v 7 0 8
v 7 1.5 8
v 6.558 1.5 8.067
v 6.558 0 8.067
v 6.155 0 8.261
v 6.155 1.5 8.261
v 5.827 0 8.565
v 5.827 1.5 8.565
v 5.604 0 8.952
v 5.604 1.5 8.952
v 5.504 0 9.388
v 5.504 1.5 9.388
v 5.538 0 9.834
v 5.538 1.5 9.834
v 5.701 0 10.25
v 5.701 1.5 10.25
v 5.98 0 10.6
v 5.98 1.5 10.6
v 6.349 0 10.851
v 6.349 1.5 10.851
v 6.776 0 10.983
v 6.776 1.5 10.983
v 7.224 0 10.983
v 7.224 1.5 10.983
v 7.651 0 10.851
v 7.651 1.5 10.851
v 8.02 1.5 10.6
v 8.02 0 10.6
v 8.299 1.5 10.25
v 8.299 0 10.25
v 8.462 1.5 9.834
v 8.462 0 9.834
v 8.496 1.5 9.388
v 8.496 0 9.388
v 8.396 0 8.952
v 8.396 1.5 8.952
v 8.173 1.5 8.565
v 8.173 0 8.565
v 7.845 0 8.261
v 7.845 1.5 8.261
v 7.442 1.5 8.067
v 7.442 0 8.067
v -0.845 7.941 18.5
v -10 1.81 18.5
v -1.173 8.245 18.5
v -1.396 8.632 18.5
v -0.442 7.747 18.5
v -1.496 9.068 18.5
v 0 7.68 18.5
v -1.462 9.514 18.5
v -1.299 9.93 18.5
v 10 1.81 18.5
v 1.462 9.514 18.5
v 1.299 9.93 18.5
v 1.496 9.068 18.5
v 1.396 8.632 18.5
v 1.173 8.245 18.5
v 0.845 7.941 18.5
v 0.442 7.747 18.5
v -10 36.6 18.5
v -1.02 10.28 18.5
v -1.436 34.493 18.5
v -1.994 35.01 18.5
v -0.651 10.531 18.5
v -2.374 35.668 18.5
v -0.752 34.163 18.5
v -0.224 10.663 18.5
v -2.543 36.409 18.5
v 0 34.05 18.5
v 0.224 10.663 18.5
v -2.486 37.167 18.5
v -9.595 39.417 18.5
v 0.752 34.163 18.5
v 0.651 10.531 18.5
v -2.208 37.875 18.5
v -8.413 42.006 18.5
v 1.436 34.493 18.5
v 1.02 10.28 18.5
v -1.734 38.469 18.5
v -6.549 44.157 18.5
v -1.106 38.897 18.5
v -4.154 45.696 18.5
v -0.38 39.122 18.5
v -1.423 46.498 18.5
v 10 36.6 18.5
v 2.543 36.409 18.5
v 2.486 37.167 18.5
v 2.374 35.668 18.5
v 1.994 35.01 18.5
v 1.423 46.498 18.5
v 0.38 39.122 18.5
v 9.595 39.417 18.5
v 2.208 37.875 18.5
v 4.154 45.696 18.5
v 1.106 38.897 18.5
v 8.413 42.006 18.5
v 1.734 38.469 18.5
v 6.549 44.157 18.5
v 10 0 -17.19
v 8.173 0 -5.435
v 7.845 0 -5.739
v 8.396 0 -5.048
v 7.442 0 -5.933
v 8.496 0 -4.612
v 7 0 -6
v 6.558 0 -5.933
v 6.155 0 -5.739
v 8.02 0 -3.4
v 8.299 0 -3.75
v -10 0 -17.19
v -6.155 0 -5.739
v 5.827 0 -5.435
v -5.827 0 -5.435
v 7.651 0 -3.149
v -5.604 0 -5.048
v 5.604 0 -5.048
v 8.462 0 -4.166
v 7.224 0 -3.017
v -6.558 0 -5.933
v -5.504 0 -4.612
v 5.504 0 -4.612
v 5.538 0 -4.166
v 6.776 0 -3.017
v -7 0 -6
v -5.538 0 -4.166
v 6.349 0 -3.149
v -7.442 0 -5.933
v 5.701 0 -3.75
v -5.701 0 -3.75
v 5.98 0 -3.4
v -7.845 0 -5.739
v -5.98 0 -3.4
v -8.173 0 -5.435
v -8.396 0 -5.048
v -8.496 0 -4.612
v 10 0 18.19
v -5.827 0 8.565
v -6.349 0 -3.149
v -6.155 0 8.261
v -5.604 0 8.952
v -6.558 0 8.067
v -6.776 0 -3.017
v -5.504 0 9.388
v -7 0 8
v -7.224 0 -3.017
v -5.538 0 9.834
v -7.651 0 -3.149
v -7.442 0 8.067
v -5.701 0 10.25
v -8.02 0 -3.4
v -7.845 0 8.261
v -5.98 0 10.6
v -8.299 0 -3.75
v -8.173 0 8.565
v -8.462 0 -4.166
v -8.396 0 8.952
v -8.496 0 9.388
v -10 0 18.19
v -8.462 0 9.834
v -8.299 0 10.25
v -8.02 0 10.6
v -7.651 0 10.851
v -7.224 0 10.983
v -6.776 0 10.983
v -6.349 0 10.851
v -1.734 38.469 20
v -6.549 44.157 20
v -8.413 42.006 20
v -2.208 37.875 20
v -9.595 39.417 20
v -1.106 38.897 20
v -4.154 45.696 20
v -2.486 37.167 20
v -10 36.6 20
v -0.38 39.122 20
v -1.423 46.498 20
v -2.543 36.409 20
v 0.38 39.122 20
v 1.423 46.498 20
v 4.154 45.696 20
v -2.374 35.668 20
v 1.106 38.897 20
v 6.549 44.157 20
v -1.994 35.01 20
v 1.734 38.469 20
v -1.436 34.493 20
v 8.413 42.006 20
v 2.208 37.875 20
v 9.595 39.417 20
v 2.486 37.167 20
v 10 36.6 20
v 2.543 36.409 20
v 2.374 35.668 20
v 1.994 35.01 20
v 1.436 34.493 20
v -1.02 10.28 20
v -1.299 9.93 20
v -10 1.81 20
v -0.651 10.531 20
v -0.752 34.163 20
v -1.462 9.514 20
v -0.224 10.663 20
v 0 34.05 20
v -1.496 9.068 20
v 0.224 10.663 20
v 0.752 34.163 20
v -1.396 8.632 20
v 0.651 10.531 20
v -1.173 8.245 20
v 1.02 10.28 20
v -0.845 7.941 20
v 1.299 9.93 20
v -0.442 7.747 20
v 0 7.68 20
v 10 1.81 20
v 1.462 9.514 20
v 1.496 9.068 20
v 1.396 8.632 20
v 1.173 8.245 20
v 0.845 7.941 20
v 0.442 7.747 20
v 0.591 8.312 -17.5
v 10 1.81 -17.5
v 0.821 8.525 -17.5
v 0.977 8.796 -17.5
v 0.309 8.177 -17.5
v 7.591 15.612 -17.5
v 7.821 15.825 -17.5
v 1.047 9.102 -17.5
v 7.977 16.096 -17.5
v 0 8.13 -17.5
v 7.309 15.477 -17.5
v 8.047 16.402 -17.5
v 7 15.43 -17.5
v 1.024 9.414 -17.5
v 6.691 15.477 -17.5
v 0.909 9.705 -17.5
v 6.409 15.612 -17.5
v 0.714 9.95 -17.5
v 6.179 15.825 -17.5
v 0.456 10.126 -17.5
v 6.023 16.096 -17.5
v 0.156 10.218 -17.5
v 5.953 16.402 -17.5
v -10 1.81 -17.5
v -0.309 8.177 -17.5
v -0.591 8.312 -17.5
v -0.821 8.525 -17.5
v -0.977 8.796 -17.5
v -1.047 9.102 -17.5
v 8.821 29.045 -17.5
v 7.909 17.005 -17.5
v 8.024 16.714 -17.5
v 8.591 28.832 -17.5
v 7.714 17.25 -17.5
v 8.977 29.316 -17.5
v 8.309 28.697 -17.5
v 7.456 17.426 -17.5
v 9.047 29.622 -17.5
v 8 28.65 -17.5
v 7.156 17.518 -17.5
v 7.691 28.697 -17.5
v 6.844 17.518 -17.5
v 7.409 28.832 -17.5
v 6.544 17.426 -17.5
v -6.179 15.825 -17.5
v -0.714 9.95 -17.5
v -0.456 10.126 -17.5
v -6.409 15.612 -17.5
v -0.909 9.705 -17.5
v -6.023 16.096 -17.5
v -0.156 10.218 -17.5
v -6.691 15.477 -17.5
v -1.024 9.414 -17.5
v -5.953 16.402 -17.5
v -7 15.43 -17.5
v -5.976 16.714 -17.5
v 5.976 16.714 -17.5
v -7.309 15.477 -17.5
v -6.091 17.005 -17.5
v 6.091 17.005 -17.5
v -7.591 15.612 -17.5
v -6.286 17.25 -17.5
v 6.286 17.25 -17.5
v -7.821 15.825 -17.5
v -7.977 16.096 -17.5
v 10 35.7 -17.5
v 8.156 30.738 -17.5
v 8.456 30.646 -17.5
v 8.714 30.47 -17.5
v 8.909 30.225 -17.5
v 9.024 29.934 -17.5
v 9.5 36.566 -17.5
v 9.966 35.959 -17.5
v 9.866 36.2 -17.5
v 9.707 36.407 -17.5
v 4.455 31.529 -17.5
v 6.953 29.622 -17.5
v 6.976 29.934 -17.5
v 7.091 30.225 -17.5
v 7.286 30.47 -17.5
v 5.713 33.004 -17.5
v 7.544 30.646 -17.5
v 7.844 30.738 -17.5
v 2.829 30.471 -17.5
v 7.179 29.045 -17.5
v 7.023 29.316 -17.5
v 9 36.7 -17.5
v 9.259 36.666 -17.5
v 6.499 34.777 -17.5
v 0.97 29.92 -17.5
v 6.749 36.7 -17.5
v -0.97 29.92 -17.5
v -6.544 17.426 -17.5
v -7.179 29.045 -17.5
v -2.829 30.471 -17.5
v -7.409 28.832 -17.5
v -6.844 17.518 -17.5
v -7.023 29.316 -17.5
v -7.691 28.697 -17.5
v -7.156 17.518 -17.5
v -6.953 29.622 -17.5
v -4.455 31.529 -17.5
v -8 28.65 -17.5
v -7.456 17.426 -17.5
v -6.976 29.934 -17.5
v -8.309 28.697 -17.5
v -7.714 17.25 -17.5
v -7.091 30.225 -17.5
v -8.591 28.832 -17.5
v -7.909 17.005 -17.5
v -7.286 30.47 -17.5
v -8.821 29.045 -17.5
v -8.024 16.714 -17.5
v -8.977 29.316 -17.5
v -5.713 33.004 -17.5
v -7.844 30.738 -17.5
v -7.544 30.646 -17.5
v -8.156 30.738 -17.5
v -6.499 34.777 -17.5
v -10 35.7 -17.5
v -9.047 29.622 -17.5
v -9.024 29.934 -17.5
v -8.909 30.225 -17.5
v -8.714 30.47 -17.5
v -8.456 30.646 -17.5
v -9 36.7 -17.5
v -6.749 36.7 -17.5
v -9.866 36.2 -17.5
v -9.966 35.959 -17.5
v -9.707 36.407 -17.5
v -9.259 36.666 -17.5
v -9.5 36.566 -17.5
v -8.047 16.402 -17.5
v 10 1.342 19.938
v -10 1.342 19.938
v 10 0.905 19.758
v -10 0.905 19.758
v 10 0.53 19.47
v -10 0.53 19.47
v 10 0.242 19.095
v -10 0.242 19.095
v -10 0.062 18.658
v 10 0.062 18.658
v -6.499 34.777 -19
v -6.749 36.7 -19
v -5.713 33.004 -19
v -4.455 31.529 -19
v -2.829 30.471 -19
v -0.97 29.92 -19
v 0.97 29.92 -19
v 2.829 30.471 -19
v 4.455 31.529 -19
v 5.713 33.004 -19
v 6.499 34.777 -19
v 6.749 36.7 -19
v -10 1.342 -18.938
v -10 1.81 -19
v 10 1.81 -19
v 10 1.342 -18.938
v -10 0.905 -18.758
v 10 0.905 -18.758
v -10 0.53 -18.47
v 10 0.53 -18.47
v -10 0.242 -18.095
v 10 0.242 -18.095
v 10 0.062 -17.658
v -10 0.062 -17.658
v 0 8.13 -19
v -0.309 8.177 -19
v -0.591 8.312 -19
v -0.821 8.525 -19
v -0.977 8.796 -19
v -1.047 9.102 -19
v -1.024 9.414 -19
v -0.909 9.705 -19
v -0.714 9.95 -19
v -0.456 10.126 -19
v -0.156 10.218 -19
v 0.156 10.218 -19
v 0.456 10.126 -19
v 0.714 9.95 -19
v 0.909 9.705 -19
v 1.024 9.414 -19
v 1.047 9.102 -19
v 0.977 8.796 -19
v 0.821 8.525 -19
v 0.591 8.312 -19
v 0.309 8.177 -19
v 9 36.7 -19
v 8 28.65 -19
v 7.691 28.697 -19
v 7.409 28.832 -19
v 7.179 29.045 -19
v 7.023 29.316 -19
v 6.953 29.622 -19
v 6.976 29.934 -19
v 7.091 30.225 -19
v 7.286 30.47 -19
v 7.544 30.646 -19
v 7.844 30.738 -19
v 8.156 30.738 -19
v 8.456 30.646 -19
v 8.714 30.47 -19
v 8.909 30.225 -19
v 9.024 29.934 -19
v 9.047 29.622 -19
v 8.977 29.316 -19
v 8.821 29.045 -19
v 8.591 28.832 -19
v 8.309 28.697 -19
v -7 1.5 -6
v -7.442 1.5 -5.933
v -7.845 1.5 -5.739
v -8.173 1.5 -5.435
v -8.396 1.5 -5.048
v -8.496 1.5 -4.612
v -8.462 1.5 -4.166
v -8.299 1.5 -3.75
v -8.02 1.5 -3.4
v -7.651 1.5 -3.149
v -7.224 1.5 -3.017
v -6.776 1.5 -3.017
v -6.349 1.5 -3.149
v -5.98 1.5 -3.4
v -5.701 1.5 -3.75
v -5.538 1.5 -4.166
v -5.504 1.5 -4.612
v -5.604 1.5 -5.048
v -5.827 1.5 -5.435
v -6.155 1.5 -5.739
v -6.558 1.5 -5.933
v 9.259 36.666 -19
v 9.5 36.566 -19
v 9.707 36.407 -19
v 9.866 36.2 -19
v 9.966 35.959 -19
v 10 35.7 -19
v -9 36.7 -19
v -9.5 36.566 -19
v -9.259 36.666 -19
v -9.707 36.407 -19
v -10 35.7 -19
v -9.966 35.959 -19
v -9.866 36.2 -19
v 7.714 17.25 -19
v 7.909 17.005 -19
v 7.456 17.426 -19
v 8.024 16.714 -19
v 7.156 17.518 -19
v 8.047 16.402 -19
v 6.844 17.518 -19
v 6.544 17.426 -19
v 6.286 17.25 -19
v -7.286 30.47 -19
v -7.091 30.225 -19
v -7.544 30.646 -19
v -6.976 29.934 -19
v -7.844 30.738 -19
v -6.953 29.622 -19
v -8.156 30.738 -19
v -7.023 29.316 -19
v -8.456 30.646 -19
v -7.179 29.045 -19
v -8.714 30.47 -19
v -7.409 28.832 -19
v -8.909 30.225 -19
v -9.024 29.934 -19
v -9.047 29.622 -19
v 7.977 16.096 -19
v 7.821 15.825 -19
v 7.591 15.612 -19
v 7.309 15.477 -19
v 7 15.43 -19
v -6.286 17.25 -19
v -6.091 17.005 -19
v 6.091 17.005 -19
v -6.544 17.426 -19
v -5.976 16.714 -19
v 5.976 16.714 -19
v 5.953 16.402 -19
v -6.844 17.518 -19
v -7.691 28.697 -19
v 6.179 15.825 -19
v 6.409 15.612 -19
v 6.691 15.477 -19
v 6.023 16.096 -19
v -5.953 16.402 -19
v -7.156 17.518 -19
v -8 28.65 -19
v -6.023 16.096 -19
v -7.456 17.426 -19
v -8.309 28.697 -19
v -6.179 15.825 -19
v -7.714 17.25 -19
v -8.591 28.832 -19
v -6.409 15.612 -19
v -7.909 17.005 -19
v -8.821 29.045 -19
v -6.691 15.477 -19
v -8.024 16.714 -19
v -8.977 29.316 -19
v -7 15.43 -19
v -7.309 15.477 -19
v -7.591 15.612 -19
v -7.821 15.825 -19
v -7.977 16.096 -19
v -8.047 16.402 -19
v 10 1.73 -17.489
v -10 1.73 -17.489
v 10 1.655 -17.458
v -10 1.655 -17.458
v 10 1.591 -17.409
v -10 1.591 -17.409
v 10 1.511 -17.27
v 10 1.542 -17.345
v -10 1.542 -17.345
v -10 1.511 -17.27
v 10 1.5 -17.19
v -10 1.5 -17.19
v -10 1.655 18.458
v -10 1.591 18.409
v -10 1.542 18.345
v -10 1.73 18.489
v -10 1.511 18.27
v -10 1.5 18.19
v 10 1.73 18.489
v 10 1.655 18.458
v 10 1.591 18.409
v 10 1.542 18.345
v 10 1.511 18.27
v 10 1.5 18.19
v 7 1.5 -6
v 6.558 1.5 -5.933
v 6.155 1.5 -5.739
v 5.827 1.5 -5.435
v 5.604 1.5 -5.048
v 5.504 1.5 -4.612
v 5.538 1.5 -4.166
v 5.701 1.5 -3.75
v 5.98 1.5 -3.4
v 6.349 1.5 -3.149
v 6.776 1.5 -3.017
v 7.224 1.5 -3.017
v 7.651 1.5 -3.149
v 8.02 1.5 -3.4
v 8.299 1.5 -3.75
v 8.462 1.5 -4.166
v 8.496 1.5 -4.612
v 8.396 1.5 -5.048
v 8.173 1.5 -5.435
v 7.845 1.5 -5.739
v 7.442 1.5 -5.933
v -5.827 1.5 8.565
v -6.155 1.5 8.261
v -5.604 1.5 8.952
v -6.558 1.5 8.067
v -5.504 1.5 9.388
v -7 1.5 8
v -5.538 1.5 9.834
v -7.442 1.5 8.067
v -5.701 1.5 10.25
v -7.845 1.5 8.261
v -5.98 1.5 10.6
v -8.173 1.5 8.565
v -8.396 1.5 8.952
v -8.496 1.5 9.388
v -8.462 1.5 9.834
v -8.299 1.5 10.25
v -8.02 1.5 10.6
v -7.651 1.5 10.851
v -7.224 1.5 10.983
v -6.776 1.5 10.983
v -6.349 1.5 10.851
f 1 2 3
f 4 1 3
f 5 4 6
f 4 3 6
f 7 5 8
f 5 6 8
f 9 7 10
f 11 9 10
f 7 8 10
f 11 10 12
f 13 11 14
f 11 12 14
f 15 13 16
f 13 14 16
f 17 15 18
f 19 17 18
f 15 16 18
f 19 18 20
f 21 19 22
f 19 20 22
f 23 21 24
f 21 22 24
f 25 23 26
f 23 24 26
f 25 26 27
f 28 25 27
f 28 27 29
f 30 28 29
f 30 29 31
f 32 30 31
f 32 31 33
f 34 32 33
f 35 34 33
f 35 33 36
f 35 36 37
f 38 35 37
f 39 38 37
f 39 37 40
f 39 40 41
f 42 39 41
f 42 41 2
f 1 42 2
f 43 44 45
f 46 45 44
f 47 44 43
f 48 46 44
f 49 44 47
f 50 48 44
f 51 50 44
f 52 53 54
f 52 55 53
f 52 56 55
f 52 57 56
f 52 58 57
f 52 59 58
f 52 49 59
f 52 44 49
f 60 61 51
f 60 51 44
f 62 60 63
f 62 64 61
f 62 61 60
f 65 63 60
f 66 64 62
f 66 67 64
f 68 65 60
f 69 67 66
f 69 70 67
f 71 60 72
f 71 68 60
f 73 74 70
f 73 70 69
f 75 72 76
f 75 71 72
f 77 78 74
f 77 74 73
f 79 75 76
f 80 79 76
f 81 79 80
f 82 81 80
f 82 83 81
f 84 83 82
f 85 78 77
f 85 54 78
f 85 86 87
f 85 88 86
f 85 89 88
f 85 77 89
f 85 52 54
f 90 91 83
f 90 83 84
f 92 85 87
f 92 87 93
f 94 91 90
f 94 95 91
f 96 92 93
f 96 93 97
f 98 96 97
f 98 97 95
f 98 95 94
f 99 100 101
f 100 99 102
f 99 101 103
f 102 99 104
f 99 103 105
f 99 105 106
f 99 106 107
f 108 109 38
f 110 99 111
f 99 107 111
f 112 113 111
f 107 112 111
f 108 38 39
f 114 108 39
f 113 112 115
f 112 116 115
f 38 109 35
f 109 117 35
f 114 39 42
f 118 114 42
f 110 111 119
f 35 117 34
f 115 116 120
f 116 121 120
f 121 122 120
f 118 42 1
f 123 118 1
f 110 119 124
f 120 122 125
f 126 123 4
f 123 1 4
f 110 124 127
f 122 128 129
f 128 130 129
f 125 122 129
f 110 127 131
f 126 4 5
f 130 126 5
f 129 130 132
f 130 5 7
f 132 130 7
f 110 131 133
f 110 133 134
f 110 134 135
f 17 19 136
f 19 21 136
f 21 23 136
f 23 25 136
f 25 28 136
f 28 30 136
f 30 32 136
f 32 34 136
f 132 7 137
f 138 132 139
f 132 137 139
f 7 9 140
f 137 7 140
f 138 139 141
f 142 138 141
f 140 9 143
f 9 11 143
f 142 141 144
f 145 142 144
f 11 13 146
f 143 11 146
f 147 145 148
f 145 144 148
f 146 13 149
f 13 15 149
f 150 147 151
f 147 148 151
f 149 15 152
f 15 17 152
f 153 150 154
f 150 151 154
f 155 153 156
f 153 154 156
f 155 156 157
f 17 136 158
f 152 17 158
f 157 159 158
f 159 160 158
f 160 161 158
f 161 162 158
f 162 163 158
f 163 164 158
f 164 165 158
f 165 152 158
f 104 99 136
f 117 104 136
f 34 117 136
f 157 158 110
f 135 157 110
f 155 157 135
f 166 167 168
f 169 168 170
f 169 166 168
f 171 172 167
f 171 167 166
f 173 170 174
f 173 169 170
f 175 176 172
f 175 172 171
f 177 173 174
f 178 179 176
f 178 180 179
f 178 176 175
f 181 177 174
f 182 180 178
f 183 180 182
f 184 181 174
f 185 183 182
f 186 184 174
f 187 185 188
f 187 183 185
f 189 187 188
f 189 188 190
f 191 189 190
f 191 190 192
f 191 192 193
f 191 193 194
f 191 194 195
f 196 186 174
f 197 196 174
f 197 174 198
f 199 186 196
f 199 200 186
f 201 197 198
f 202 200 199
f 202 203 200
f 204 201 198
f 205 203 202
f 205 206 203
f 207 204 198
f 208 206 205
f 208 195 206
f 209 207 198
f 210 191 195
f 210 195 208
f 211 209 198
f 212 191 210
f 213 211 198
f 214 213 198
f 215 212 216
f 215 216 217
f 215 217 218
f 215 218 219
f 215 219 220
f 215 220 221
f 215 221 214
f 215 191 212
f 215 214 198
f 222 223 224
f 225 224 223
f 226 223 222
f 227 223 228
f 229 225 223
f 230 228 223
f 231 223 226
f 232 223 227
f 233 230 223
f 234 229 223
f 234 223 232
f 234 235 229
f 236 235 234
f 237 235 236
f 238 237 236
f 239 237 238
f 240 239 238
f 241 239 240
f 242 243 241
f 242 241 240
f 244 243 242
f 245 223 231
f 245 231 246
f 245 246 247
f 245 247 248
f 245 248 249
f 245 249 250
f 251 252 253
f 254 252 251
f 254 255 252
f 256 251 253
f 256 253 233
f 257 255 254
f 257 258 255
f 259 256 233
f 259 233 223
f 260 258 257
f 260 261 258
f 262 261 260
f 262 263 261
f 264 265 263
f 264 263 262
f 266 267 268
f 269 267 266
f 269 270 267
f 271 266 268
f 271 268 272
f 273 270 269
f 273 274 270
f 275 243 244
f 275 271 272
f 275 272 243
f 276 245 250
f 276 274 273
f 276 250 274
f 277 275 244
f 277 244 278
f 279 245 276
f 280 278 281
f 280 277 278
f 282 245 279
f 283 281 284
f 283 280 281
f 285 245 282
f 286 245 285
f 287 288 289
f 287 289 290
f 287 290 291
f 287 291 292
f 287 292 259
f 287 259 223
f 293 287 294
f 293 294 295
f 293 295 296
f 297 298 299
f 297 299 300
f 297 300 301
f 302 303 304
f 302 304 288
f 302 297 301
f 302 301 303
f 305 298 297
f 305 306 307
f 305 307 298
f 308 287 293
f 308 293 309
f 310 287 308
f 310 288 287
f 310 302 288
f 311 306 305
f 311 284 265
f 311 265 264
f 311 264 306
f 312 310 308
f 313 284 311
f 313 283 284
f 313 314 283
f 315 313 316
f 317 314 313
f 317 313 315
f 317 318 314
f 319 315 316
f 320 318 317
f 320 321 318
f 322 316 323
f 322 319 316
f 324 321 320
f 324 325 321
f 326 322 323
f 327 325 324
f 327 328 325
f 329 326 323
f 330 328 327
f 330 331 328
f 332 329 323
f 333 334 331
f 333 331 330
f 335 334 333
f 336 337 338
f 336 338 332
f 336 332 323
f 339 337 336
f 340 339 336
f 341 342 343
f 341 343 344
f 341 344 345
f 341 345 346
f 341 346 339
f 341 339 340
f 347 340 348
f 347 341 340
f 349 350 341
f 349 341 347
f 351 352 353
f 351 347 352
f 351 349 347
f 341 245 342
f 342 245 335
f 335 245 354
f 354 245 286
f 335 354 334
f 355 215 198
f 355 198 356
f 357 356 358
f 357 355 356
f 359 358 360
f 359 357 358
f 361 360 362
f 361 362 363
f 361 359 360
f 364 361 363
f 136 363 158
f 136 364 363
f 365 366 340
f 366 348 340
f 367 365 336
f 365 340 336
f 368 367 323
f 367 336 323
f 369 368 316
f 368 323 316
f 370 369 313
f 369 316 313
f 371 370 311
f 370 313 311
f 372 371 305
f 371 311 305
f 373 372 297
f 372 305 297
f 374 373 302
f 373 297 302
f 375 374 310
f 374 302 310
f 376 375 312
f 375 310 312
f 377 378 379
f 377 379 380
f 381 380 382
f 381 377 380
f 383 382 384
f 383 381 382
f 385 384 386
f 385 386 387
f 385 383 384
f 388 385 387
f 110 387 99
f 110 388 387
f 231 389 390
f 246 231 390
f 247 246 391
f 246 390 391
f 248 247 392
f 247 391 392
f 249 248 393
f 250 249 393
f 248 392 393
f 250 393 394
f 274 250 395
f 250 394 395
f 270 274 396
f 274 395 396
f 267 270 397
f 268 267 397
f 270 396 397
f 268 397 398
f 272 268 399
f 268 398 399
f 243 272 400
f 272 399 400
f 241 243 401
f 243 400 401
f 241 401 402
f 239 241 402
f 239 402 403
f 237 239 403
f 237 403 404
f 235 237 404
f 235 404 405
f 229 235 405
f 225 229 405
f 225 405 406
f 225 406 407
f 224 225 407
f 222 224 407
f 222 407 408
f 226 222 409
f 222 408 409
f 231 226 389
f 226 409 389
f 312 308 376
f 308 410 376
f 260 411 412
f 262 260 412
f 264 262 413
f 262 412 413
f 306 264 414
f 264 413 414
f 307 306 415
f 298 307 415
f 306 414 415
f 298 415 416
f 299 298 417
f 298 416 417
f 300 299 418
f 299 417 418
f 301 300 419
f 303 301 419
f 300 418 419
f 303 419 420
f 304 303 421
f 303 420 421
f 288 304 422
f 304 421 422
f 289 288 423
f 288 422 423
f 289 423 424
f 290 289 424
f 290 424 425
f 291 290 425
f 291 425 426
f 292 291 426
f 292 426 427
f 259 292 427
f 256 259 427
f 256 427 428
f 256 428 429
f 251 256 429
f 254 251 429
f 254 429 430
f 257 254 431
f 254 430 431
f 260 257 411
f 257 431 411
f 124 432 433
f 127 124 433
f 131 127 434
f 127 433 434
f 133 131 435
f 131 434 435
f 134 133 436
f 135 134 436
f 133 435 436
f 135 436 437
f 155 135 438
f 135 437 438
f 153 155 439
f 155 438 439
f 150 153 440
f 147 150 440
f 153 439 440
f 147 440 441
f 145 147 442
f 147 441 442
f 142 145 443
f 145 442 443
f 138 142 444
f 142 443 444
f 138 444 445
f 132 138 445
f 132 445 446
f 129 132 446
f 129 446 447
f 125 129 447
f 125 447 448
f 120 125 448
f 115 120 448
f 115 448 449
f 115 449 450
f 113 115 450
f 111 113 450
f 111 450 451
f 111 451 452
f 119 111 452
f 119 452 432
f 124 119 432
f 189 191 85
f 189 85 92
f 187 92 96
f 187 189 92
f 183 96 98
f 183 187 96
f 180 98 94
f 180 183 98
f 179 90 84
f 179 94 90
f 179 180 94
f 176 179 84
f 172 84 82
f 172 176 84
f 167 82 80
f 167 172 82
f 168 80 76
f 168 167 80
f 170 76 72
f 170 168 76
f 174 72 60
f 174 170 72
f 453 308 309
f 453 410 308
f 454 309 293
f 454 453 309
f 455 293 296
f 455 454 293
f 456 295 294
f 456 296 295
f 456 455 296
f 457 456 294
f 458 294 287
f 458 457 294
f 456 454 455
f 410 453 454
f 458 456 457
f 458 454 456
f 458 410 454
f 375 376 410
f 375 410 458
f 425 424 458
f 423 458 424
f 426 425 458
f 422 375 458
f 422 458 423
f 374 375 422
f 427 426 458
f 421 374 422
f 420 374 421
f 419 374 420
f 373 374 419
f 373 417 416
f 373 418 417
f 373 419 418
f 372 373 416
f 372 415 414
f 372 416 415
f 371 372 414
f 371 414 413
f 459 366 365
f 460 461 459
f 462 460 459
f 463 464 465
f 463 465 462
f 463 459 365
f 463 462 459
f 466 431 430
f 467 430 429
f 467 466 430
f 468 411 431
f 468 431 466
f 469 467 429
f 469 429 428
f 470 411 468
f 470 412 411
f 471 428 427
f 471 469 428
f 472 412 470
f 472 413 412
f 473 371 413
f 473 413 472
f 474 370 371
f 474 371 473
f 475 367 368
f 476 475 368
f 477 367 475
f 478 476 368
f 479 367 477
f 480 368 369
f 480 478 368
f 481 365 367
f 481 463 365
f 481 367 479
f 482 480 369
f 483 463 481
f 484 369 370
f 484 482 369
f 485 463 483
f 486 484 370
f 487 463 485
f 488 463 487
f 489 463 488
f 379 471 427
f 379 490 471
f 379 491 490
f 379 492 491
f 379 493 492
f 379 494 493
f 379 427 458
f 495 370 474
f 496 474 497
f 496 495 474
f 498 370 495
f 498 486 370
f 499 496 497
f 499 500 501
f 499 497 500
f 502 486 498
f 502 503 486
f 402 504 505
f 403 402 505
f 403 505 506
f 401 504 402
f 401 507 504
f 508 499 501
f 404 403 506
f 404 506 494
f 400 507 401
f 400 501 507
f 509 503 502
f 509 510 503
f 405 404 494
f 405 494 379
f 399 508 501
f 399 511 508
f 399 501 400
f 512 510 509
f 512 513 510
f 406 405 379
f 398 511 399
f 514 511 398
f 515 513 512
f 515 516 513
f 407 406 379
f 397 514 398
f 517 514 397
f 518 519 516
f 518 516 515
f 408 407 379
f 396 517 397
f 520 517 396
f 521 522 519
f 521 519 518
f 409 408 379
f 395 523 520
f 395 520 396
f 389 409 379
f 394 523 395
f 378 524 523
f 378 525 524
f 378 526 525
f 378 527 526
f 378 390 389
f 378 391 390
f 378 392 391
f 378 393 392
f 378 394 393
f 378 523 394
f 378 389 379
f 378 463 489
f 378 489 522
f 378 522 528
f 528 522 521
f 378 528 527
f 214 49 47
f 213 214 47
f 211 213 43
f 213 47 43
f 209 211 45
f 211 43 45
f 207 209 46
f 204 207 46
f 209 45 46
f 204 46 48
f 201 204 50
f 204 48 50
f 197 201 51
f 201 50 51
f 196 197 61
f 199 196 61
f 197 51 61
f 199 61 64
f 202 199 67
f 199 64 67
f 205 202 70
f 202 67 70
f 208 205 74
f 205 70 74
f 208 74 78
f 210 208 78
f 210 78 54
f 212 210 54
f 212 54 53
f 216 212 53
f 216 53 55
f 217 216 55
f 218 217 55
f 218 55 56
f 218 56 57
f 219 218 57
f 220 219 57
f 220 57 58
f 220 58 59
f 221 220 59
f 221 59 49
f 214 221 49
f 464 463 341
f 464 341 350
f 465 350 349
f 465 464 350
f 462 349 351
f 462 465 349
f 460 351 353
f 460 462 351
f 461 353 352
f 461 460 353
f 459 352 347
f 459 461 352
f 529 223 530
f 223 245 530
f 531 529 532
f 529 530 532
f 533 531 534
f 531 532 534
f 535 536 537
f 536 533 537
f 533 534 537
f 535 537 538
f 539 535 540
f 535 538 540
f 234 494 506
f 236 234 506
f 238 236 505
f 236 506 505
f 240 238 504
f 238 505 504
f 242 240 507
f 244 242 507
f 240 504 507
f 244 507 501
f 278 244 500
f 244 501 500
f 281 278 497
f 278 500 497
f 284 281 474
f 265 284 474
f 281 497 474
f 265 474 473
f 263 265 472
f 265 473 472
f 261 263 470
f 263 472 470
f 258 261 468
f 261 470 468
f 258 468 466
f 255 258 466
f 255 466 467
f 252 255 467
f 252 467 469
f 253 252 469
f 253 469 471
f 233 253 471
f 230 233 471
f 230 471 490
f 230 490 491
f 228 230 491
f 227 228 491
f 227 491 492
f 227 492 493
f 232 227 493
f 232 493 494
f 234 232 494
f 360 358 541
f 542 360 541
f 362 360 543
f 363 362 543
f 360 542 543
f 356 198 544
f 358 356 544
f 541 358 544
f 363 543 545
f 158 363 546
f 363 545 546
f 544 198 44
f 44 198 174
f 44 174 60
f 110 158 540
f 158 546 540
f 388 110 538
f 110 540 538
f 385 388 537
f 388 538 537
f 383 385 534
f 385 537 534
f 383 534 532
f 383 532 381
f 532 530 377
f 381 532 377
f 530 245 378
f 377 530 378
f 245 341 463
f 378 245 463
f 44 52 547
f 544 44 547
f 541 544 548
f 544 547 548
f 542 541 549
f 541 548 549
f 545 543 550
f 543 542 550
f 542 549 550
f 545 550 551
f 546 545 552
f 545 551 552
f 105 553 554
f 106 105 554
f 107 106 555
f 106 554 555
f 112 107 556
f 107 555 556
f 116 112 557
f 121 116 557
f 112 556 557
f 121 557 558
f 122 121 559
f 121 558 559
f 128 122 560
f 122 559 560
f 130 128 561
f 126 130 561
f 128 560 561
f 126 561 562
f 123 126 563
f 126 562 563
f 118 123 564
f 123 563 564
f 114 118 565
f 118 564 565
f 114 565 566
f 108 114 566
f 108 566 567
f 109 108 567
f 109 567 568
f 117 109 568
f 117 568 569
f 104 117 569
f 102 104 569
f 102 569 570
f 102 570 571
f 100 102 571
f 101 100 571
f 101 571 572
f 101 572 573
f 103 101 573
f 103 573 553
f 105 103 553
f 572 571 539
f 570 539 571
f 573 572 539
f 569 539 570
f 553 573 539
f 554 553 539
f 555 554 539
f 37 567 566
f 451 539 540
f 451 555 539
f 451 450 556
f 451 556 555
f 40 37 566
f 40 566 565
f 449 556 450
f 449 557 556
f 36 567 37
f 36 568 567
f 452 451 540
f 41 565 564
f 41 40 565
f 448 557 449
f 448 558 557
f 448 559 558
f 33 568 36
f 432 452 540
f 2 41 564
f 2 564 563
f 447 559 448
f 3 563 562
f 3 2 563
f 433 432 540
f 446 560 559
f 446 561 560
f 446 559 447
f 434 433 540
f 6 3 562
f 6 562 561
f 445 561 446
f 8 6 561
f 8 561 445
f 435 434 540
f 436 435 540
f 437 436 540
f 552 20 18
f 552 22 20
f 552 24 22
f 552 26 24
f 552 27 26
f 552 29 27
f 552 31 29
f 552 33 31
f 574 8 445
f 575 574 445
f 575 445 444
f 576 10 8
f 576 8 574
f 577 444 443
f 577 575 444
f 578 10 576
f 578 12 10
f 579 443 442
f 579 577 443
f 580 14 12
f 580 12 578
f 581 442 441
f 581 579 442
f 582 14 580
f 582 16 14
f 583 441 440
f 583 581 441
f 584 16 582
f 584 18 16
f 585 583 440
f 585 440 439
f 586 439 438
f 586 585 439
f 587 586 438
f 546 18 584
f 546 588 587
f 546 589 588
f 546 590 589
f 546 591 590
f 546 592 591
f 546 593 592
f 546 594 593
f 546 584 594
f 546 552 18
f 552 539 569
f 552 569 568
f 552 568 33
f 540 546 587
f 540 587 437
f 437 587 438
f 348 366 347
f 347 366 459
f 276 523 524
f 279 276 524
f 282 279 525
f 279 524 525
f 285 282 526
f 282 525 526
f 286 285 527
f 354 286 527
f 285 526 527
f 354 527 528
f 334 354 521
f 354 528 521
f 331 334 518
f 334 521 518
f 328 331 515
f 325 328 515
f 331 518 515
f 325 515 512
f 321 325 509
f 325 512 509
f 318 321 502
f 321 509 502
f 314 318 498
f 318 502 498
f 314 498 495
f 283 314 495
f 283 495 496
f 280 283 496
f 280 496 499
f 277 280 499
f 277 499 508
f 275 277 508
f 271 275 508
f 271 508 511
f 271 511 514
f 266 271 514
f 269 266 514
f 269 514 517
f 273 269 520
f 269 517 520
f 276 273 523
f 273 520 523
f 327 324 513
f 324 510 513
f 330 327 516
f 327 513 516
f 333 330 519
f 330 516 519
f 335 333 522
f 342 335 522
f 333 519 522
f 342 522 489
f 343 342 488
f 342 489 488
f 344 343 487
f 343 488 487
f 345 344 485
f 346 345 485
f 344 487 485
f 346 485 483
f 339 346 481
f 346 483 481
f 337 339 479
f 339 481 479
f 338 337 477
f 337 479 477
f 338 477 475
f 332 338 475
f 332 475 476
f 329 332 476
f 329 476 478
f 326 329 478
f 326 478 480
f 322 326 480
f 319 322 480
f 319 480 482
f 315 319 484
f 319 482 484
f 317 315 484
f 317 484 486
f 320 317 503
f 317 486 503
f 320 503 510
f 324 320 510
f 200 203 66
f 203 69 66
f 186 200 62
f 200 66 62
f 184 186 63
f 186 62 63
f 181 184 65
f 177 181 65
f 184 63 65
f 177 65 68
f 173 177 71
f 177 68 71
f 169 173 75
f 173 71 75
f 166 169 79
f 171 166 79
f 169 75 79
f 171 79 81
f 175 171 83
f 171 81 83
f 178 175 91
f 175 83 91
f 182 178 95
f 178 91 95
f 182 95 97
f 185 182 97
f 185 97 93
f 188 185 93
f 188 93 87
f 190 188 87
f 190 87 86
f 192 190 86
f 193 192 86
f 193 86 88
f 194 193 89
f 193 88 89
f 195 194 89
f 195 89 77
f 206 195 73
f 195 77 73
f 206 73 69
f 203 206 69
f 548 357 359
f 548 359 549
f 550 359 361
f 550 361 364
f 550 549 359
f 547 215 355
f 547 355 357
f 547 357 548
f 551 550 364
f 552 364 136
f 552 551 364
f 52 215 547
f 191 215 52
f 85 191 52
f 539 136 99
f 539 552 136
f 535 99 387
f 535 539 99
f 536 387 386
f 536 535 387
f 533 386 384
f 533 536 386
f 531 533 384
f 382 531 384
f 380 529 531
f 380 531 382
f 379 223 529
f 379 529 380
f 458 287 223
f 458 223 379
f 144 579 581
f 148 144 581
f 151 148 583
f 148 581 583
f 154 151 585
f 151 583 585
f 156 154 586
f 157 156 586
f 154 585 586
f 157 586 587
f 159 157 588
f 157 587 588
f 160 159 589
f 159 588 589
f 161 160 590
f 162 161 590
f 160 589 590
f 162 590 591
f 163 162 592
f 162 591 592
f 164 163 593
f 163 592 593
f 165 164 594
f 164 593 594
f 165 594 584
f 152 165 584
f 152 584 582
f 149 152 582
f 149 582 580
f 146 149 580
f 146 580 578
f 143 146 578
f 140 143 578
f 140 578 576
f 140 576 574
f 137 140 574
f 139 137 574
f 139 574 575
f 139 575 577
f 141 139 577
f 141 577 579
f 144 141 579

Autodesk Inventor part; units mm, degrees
ref_plane "YZ Plane" through (0, 0, 0) normal (1, 0, 0) x (0, 1, 0)
ref_plane "XZ Plane" through (0, 0, 0) normal (0, 1, 0) x (-1, 0, 0)
ref_plane "XY Plane" through (0, 0, 0) normal (0, 0, 1) x (1, 0, 0)
sketch "Sketch1" plane through (0, 0, 0) normal (0, 1, 0) x (-1, 0, 0)
  line L0 (10, -17.5) -> (-10, -17.5)
  line L1 (-10, -17.5) -> (-10, 18.5)
  line L2 (-10, 18.5) -> (10, 18.5)
  line L3 (10, 18.5) -> (10, -17.5)
  point P0 (0, 0)
  dimension "d0" = 20
  dimension "d1" = 36
  dimension "d2" = 17.5
  dimension "d3" = 10
extrude "Plate1" add sketch "Sketch1" along normal blind 1.5
sketch "Sketch2" plane through (-10, 0, -19) normal (0, 0, 1) x (1, 0, 0)
  line L0 (20, 0) -> (0, 0)
  line L1 (0, 0) -> (0, 46.6)
  line L2 (0, 46.6) -> (20, 46.6)
  line L3 (20, 46.6) -> (20, 0)
edge flange "Flange1" height 46.6 angle 90 thickness 1.5 bend radius 0.31 thickness toward (0, 0, 1) relief tear relief width 1.5 relief depth 0.75 edges at (0, 1.5, -17.5) wall of the first edge with corners at (10, 0, -19) (-10, 0, -19) (-10, 46.6, -19) (10, 46.6, -19)
bend "Bend1"
corner "Corner1"
sketch "Sketch3" plane through (10, 0, 20) normal (0, 0, -1) x (-1, 0, 0)
  line L0 (20, 0) -> (0, 0)
  line L1 (0, 0) -> (0, 46.6)
  line L2 (0, 46.6) -> (20, 46.6)
  line L3 (20, 46.6) -> (20, 0)
edge flange "Flange2" height 46.6 angle 90 thickness 1.5 bend radius 0.31 thickness toward (0, 0, -1) relief tear relief width 1.5 relief depth 0.75 edges at (0, 1.5, 18.5) wall of the first edge with corners at (-10, 0, 20) (10, 0, 20) (10, 46.6, 20) (-10, 46.6, 20)
bend "Bend2"
corner "Corner2"
sketch "Sketch4" plane through (-10, 46.6, 20) normal (0, 0, 1) x (1, 0, 0)
  circle A0 centre (10, -10) radius 10
  line L0 (0, 0) -> (20, 0) projected
  line L1 (0, 0) -> (20, 0)
  line L2 (20, 0) -> (20, -10)
  line L3 (20, -10) -> (0, -10)
  line L4 (0, -10) -> (0, 0)
  line L5 (0, -44.79) -> (0, 0) projected
  point P0 (10, -46.6)
  point P1 (10, -10)
  point P2 (20, 0)
  point P3 (10, 0)
  point P4 (0, -10)
  point P5 (8.5893, 0)
  point P6 (0, -10)
  dimension "d26" = 20
  dimension "d25" = 10
  dimension "d27" = 10
  dimension "d28" = 10
extrude "Extrusion1" cut sketch "Sketch4" against normal blind 10 contours L4 L0 A0 | A0 L0 L2
sketch "Sketch5" plane through (10, 46.6, -19) normal (0, 0, -1) x (-1, 0, 0)
  arc A0 (20, -10) -> (0, -10) centre (10, -10) ccw projected
  point P0 (10, -46.6)
hole "Hole1" at (0, 36.6, -19) direction (0, 0, 1) diameter 13.5 depth 1.5
sketch "Sketch6" plane through (10, 46.6, -19) normal (0, 0, -1) x (-1, 0, 0)
  circle A0 centre (10, -10) radius 6.75 projected
  line L0 (0, 0) -> (20, 0) projected
  line L1 (0, -44.79) -> (0, 0) projected
  line L2 (24, 0) -> (-4, 0)
  line L3 (-4, 0) -> (-4, -9.9)
  line L4 (-4, -9.9) -> (24, -9.9)
  line L5 (24, -9.9) -> (24, 0)
  point P0 (10, -46.6)
  point P1 (20, 0)
  point P2 (6.005, 0)
  point P3 (13.995, 0)
  dimension "d38" = 9.9
  dimension "d39" = 4
  dimension "d40" = 28
extrude "Extrusion2" cut sketch "Sketch6" against normal blind 10 contours L4 A0 | A0 L4 L1 L0 L2 L5 | L4 L3 L2 L1 picked at (7.8223, -9.3675)
fillet "Fillet1" radius 1 2 edges at (-10, 36.7, -18.25) (10, 36.7, -18.25)
sketch "Sketch7" plane through (-10, 1.81, 20) normal (0, 0, 1) x (1, 0, 0)
  arc A0 (20, 34.79) -> (0, 34.79) centre (10, 34.79) ccw projected
  point P0 (10, -1.81)
hole "Hole2" at (0, 36.6, 20) direction (0, 0, -1) diameter 5.1 depth 1.5 clearance for "Hex Head Bolt" size "M5" standard "Ansi Metric M Profile"
sketch "Sketch8" plane through (0, 0, 0) normal (0, -1, 0) x (1, 0, 0)
  line L0 (2.55, 18.5) -> (-2.55, 18.5) projected
  line L1 (-10, 18.5) -> (10, 18.5) projected
  line L2 (10, 18.5) -> (-10, 18.5) projected
  line L3 (10, 18.19) -> (-10, 18.19) projected
  line L4 (-10, -17.19) -> (-10, 18.19) projected
  line L5 (-10, -17.19) -> (10, -17.19) projected
  line L6 (10, 18.19) -> (10, -17.19) projected
  point P0 (0, 0)
  point P1 (7, 9.5)
  point P2 (7, -4.5)
  point P3 (-7, 9.5)
  point P4 (-7, -4.5)
  dimension "d51" = 9
  dimension "d52" = 3
  dimension "d55" = 14
  dimension "d58" = 14
hole "Hole3" at (7, 0, 9.5) at (7, 0, -4.5) at (-7, 0, 9.5) at (-7, 0, -4.5) direction (0, 1, 0) diameter 3 depth 1.5
hole "Hole5" at (-8, 29.7, -17.5) at (8, 29.7, -17.5) at (7, 16.48, -17.5) at (-7, 16.48, -17.5) at (0, 9.18, -17.5) direction (0, 0, -1) diameter 2.1 depth 1.5
sketch "Sketch11" plane through (-10, 1.81, 20) normal (0, 0, 1) x (1, 0, 0)
  circle A0 centre (10, 7.37) radius 1.1
  point P0 (10, -1.81)
hole "Hole6" at (0, 9.18, 20) direction (0, 0, -1) diameter 3 depth 1.5
equation "\"d66\" = Thickness"
equation "\"d80\" = Thickness"
equation "\"d49\" = Thickness"
equation "\"d4\" = Thickness"
equation "\"d15\" = BendReliefWidth"
equation "\"d16\" = BendReliefDepth"
equation "\"d17\" = MinimumRemnant"
equation "\"d18\" = TransitionRadius"
equation "\"d21\" = BendRadius"
equation "\"d22\" = CornerReliefSize"
equation "\"d23\" = GapSize"
equation "\"d24\" = JacobiRadiusSize"
equation "\"d36\" = Thickness"
equation "\"d5\" = BendReliefWidth"
equation "\"d6\" = BendReliefDepth"
equation "\"d7\" = MinimumRemnant"
equation "\"d8\" = TransitionRadius"
equation "\"d11\" = BendRadius"
equation "\"d12\" = CornerReliefSize"
equation "\"d13\" = GapSize"
equation "\"d14\" = JacobiRadiusSize"
equation "\"d87\" = Thickness"
equation "\"BendReliefWidth\" = Thickness"
equation "\"BendReliefDepth\" = 0.5 * Thickness"
equation "\"CornerReliefSize\" = 4 * Thickness"
equation "\"MinimumRemnant\" = 2 * Thickness"
equation "\"TransitionRadius\" = BendRadius"
equation "\"JacobiRadiusSize\" = BendRadius"
equation "\"GapSize\" = Thickness"
equation "\"Thickness\" = 1.5"
equation "\"BendRadius\" = 0.31"
properties part number "axis_9_bottom_frame" material "Aluminum 6061-AHC"
